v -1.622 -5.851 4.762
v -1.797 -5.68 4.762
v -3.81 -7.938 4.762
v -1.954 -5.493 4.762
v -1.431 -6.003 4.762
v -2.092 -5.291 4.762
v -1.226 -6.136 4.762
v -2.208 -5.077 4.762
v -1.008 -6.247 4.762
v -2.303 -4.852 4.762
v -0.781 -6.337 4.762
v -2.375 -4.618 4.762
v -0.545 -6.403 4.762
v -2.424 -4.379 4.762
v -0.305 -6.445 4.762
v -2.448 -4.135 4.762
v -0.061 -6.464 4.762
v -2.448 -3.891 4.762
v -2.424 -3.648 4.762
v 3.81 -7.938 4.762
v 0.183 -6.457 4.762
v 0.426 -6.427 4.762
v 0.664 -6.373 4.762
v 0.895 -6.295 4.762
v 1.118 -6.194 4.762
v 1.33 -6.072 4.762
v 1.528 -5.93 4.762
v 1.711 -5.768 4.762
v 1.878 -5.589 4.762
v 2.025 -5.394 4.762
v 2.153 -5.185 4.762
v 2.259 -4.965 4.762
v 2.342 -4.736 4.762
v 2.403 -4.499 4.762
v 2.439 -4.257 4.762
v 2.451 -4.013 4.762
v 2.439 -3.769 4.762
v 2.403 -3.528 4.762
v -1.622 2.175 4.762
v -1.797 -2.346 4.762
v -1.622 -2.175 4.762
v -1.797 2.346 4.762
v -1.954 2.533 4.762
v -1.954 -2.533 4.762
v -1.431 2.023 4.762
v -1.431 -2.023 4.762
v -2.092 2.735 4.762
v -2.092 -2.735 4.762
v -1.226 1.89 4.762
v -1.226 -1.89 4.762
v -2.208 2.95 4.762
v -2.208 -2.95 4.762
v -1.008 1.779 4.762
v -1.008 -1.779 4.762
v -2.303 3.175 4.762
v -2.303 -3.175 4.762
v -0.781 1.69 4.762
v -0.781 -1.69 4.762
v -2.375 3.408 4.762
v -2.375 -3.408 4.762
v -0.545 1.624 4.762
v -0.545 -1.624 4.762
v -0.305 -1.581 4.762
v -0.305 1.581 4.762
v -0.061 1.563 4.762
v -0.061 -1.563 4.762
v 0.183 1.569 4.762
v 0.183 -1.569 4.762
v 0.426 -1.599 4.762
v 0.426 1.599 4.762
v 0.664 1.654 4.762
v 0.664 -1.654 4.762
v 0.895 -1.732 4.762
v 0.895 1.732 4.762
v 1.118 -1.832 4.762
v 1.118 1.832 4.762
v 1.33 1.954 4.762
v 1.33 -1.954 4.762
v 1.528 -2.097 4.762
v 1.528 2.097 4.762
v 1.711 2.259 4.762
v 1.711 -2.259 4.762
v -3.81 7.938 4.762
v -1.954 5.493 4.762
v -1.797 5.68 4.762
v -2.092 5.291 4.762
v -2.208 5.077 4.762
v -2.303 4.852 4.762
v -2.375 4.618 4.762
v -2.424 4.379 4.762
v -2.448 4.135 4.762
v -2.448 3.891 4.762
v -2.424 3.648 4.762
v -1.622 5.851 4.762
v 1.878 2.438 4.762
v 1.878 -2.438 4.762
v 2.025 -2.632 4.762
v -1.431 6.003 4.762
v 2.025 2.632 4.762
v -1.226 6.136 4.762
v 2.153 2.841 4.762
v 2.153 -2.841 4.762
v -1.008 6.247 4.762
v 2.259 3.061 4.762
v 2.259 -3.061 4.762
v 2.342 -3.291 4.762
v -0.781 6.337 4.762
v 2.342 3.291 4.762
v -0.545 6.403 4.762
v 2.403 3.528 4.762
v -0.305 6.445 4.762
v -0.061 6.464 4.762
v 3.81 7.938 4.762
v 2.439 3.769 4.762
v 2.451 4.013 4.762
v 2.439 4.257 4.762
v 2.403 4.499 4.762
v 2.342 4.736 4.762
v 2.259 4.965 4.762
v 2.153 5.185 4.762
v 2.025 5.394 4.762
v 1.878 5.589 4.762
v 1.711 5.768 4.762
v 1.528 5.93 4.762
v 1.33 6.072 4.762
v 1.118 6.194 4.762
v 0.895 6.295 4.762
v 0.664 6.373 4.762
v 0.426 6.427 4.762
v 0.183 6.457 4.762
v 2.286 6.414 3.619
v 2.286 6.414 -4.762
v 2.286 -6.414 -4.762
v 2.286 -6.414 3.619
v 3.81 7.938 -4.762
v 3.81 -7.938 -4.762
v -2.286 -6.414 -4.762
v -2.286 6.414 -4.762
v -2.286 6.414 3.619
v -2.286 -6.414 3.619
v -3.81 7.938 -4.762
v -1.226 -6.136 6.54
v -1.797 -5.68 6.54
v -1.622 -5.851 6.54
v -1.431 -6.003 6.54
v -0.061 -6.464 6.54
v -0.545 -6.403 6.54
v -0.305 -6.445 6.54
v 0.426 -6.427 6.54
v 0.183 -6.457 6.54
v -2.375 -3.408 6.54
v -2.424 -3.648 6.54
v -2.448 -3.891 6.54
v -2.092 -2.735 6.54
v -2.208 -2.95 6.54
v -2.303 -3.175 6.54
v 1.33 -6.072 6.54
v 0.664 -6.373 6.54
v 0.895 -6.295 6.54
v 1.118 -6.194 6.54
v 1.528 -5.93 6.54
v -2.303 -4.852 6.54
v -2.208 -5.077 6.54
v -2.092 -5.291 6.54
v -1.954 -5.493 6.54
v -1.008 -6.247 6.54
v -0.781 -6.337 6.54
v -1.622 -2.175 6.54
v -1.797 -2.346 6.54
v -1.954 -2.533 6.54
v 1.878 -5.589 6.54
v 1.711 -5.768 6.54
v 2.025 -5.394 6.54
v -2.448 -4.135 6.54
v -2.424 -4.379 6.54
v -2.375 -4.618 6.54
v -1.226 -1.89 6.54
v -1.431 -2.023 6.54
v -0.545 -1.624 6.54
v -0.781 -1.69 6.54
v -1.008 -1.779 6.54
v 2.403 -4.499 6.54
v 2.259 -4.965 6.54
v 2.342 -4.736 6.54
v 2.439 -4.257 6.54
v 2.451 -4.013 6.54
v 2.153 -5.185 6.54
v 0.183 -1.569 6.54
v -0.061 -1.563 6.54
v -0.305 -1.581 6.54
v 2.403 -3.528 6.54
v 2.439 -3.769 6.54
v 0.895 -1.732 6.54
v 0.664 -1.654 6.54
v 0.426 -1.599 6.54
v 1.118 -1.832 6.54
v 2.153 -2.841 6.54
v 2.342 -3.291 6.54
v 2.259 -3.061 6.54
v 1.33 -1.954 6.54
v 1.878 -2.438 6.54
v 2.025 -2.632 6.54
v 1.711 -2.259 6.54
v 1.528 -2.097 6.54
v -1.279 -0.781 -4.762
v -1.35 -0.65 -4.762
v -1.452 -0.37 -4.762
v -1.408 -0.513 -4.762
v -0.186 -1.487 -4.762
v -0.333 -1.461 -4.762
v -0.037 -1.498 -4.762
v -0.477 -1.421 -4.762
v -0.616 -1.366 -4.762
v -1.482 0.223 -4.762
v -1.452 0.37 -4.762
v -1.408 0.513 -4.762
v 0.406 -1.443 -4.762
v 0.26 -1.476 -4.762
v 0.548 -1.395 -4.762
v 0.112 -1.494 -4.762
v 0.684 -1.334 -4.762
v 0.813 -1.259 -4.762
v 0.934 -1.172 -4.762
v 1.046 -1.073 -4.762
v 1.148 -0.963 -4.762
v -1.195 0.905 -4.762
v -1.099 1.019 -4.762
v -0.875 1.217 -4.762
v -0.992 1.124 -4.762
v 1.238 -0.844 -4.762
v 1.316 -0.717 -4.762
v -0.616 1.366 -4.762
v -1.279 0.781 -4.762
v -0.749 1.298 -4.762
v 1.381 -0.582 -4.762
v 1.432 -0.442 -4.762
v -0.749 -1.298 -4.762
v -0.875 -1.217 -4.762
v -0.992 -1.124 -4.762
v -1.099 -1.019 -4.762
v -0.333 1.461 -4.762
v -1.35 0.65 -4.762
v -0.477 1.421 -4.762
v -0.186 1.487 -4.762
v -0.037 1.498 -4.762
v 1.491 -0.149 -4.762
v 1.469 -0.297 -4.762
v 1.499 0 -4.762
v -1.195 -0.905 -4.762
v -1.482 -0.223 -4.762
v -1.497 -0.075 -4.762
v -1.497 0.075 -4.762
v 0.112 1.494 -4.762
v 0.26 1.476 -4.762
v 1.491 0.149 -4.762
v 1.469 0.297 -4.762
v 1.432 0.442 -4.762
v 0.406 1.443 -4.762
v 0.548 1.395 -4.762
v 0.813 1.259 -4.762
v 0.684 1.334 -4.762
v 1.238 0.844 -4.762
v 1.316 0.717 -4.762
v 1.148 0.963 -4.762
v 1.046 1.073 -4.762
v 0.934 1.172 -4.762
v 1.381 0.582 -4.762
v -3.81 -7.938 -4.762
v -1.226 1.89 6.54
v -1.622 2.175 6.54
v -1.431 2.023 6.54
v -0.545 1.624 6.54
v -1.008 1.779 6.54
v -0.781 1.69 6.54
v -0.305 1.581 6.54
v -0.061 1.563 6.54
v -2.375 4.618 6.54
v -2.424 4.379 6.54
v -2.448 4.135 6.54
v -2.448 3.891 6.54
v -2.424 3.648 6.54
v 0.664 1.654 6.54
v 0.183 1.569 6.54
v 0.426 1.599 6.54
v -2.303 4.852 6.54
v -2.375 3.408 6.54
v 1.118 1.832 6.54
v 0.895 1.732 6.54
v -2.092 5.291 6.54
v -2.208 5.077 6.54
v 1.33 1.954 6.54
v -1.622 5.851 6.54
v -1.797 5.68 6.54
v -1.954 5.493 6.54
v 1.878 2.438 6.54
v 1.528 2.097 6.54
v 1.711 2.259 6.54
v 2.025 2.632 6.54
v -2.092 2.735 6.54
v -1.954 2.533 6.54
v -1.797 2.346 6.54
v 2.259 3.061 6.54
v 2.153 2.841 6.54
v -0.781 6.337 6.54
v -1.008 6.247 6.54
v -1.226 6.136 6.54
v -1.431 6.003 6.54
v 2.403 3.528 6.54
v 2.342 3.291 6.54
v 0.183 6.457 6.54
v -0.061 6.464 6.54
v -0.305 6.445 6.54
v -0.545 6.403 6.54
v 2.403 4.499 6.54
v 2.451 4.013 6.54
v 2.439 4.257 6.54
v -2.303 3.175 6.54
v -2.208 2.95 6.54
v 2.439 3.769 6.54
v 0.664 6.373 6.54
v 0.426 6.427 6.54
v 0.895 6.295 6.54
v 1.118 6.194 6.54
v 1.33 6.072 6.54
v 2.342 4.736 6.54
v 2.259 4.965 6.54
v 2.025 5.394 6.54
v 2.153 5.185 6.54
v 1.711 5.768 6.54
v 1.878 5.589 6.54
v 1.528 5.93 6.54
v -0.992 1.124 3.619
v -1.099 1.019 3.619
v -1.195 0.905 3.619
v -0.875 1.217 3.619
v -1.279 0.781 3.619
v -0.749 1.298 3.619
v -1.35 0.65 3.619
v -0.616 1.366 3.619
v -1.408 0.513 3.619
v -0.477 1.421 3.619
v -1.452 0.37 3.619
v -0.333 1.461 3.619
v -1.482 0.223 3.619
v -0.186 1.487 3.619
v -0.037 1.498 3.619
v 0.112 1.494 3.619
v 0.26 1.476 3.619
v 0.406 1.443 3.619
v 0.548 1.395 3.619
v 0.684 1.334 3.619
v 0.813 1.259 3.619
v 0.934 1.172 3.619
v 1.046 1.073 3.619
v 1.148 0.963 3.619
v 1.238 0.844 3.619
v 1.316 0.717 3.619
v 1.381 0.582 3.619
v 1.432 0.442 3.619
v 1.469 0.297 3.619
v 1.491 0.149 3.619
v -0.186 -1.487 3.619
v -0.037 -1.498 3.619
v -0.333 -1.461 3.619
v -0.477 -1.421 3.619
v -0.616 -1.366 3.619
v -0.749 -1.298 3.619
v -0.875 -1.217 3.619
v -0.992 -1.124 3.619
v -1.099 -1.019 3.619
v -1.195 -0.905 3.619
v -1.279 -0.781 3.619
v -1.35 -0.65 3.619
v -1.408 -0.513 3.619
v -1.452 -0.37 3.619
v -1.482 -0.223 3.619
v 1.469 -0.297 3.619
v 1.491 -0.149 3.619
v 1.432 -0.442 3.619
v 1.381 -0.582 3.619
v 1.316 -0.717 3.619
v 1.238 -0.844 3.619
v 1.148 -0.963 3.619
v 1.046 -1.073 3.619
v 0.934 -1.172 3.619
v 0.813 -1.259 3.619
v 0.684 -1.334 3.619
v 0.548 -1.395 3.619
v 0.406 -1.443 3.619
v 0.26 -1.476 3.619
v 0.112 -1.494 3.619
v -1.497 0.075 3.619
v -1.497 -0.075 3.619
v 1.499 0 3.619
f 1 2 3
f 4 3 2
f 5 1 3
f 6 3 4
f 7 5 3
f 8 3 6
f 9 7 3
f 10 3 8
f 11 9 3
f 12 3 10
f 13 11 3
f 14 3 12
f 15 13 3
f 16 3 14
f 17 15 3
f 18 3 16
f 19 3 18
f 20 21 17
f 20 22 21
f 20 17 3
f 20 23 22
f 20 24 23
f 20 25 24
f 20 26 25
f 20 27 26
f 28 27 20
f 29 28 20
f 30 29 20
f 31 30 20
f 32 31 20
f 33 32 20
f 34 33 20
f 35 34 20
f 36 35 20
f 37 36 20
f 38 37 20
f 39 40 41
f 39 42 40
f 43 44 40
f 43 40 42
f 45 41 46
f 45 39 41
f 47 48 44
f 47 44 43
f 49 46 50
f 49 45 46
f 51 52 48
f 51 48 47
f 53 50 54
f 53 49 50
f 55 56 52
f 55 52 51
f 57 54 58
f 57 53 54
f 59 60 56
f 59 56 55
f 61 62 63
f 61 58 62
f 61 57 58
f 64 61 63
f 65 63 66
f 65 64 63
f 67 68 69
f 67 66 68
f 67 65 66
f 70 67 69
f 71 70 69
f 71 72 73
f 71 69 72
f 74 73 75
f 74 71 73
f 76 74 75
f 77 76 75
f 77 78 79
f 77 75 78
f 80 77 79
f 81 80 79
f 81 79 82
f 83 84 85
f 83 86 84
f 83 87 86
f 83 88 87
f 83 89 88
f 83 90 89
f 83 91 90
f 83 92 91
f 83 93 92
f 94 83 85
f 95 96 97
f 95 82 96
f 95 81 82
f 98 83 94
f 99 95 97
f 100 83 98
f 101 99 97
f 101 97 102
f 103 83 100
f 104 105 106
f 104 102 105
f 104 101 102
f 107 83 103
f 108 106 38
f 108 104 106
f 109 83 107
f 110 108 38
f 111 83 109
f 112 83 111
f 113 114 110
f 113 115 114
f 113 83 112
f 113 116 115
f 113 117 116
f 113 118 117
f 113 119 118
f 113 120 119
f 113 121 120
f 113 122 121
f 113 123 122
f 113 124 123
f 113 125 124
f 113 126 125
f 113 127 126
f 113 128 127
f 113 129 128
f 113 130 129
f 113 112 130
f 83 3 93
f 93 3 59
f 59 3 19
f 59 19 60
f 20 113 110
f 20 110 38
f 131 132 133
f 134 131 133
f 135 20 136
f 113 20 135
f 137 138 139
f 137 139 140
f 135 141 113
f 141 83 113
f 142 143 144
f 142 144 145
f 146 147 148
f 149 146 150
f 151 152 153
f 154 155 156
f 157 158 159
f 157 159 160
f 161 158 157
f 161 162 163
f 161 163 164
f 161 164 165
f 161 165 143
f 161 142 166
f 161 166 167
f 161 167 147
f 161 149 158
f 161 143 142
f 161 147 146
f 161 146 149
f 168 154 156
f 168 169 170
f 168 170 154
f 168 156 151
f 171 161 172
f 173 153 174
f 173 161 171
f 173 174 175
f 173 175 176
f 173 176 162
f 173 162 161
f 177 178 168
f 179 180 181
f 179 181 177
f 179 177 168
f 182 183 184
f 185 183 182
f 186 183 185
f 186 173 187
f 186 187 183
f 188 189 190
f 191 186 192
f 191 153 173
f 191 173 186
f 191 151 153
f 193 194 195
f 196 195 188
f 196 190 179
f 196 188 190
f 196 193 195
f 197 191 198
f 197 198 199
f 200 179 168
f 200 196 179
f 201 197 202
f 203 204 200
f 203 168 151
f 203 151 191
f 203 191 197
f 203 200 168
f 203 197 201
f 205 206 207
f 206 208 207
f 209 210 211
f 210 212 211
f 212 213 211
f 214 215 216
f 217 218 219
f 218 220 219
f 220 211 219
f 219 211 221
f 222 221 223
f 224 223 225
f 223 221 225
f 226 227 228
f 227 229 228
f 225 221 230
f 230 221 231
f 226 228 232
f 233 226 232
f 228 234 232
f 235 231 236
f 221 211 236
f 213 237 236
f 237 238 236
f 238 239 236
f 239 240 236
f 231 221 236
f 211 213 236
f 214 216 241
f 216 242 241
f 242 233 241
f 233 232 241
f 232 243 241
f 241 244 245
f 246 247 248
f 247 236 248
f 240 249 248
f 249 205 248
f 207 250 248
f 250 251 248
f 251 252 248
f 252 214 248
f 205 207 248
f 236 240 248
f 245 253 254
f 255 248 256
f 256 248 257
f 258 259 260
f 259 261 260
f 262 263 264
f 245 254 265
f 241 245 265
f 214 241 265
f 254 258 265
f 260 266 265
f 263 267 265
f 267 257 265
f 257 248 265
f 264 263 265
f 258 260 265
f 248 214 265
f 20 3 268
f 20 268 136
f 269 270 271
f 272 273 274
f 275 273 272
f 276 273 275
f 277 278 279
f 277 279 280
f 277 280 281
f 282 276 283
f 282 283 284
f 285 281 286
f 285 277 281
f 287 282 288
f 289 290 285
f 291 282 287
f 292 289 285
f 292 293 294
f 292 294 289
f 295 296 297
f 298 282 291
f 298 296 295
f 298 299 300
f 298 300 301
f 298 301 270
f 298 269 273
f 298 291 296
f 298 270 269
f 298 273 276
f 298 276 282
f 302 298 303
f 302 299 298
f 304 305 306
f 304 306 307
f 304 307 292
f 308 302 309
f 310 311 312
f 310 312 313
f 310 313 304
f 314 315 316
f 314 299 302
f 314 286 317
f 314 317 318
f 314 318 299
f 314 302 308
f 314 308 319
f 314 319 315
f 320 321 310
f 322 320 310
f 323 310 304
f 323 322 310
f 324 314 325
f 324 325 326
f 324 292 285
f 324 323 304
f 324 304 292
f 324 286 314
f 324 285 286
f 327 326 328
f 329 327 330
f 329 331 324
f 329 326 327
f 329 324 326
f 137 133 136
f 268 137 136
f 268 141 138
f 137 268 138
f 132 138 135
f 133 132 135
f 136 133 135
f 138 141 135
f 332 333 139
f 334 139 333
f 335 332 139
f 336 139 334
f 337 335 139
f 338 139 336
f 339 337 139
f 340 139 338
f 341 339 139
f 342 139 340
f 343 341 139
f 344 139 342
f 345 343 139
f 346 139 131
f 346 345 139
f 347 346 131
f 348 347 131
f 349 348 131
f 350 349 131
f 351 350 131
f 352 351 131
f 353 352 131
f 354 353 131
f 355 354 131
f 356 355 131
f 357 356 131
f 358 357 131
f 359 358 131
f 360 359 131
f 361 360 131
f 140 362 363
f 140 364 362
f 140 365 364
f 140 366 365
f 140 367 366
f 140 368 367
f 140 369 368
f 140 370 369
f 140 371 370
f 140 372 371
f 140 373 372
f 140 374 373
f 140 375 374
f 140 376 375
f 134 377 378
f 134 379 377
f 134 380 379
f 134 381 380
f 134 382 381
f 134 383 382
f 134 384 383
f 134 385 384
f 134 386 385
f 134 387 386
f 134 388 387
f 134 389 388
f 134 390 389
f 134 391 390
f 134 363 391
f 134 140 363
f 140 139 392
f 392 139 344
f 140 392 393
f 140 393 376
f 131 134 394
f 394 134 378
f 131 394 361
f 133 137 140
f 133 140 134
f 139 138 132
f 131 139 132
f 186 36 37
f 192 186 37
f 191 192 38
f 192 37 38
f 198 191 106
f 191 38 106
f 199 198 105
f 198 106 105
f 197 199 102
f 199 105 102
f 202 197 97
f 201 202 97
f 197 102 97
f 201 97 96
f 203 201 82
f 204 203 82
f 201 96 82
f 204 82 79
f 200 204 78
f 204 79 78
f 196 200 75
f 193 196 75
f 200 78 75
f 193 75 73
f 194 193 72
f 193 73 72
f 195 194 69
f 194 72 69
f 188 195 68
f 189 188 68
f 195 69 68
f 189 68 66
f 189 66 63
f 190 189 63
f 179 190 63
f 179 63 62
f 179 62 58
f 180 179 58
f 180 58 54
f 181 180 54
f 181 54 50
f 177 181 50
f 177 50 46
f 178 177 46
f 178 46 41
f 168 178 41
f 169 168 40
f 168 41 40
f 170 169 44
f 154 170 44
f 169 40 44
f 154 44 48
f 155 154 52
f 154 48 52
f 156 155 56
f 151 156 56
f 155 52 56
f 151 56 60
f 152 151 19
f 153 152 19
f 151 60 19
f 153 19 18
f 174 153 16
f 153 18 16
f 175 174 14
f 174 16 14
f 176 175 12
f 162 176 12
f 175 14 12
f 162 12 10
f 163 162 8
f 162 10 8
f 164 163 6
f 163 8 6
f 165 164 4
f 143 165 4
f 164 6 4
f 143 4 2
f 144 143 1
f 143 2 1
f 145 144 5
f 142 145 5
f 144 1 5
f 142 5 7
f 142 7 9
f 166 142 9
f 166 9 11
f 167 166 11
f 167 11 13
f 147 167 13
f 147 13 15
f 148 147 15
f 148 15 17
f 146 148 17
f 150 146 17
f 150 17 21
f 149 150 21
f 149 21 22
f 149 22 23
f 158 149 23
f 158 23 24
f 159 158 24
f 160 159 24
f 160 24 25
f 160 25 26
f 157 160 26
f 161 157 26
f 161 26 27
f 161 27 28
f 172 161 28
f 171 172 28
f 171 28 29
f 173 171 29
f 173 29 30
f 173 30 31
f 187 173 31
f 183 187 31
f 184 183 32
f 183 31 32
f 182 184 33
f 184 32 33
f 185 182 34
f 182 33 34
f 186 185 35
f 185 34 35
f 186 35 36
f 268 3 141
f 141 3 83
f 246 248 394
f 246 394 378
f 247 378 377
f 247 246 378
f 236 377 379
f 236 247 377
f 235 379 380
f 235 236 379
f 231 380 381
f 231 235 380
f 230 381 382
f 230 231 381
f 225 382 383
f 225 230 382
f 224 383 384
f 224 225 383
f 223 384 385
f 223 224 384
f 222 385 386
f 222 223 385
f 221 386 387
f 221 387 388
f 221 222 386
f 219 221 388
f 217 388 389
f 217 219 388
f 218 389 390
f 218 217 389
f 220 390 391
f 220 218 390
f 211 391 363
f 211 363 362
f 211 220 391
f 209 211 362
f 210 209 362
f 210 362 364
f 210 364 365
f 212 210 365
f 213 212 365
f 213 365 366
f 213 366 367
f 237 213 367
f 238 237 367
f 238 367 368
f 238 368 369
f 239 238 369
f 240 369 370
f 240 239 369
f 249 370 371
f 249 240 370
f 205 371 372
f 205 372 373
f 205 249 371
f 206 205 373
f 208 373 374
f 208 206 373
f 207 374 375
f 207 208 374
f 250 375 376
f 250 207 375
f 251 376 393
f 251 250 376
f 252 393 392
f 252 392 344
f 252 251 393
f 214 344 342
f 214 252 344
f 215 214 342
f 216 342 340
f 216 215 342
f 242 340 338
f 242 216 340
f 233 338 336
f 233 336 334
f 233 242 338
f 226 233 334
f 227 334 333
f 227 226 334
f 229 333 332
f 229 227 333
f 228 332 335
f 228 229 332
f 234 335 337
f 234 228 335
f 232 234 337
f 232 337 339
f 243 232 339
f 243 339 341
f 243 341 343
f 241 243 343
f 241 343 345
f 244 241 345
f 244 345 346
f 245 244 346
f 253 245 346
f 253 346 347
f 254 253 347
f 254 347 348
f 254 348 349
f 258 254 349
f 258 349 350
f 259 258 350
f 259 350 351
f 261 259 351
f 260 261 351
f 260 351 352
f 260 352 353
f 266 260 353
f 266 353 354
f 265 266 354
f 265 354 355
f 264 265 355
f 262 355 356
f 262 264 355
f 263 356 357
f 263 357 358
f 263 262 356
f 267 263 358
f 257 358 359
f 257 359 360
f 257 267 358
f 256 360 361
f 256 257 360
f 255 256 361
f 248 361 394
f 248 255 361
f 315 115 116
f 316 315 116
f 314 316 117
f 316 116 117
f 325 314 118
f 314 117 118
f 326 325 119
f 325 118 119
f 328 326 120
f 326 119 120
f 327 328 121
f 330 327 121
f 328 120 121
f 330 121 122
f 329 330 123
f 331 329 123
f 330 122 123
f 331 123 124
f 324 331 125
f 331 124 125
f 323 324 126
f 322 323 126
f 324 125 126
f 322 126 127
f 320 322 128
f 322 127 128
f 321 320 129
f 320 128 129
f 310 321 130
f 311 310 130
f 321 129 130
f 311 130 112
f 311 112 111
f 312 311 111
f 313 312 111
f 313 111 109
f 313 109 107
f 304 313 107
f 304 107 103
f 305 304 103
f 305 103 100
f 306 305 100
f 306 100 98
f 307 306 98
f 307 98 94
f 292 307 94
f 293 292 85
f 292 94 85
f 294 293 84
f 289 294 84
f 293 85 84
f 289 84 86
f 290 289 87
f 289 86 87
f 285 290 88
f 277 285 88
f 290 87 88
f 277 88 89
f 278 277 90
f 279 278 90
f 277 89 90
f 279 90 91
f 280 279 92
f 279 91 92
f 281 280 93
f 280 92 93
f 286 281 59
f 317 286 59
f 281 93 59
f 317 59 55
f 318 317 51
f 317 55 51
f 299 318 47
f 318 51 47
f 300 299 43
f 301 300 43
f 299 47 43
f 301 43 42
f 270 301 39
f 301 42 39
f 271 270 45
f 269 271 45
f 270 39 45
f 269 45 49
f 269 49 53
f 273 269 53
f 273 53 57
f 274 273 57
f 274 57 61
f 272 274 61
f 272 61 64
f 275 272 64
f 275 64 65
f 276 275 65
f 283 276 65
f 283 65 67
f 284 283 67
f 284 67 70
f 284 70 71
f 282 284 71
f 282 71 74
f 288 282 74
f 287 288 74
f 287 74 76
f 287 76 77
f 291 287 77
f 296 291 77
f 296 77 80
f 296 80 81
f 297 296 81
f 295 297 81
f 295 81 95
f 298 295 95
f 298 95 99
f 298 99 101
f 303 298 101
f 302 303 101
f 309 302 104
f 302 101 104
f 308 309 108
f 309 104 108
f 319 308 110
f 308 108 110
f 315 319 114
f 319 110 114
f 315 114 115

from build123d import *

# Parameters (mm, degrees)
F0_W     = 7.62
F0_H     = 15.875
F1_DEPTH = 4.7625
F2_R     = 2.4511
F3_DEPTH = 1.778
F4_W     = 4.572
F4_H     = 12.827
F4_R     = 1.4986
F5_DEPTH = 8.382


with BuildPart() as f1:
    # F0 (on Top) → F1 (new body, symmetric)
    with BuildSketch(Plane.XY):
        Rectangle(F0_W, F0_H)
    extrude(amount=F1_DEPTH, both=True)

    # F2 (on face) → F3 (join)
    with BuildSketch(Plane.XY.offset(4.7625)):
        with Locations((0, 4.0132)):
            Circle(F2_R)
        with Locations((0, -4.0132)):
            Circle(F2_R)
    extrude(amount=F3_DEPTH)

    # F4 (on face) → F5 (cut)
    with BuildSketch(Plane(origin=(0, 0, -4.7625), x_dir=(1, 0, 0), z_dir=(0, 0, -1))):
        Rectangle(F4_W, F4_H)
        Circle(F4_R, mode=Mode.SUBTRACT)
    extrude(amount=-F5_DEPTH, mode=Mode.SUBTRACT)


solid = f1.part
